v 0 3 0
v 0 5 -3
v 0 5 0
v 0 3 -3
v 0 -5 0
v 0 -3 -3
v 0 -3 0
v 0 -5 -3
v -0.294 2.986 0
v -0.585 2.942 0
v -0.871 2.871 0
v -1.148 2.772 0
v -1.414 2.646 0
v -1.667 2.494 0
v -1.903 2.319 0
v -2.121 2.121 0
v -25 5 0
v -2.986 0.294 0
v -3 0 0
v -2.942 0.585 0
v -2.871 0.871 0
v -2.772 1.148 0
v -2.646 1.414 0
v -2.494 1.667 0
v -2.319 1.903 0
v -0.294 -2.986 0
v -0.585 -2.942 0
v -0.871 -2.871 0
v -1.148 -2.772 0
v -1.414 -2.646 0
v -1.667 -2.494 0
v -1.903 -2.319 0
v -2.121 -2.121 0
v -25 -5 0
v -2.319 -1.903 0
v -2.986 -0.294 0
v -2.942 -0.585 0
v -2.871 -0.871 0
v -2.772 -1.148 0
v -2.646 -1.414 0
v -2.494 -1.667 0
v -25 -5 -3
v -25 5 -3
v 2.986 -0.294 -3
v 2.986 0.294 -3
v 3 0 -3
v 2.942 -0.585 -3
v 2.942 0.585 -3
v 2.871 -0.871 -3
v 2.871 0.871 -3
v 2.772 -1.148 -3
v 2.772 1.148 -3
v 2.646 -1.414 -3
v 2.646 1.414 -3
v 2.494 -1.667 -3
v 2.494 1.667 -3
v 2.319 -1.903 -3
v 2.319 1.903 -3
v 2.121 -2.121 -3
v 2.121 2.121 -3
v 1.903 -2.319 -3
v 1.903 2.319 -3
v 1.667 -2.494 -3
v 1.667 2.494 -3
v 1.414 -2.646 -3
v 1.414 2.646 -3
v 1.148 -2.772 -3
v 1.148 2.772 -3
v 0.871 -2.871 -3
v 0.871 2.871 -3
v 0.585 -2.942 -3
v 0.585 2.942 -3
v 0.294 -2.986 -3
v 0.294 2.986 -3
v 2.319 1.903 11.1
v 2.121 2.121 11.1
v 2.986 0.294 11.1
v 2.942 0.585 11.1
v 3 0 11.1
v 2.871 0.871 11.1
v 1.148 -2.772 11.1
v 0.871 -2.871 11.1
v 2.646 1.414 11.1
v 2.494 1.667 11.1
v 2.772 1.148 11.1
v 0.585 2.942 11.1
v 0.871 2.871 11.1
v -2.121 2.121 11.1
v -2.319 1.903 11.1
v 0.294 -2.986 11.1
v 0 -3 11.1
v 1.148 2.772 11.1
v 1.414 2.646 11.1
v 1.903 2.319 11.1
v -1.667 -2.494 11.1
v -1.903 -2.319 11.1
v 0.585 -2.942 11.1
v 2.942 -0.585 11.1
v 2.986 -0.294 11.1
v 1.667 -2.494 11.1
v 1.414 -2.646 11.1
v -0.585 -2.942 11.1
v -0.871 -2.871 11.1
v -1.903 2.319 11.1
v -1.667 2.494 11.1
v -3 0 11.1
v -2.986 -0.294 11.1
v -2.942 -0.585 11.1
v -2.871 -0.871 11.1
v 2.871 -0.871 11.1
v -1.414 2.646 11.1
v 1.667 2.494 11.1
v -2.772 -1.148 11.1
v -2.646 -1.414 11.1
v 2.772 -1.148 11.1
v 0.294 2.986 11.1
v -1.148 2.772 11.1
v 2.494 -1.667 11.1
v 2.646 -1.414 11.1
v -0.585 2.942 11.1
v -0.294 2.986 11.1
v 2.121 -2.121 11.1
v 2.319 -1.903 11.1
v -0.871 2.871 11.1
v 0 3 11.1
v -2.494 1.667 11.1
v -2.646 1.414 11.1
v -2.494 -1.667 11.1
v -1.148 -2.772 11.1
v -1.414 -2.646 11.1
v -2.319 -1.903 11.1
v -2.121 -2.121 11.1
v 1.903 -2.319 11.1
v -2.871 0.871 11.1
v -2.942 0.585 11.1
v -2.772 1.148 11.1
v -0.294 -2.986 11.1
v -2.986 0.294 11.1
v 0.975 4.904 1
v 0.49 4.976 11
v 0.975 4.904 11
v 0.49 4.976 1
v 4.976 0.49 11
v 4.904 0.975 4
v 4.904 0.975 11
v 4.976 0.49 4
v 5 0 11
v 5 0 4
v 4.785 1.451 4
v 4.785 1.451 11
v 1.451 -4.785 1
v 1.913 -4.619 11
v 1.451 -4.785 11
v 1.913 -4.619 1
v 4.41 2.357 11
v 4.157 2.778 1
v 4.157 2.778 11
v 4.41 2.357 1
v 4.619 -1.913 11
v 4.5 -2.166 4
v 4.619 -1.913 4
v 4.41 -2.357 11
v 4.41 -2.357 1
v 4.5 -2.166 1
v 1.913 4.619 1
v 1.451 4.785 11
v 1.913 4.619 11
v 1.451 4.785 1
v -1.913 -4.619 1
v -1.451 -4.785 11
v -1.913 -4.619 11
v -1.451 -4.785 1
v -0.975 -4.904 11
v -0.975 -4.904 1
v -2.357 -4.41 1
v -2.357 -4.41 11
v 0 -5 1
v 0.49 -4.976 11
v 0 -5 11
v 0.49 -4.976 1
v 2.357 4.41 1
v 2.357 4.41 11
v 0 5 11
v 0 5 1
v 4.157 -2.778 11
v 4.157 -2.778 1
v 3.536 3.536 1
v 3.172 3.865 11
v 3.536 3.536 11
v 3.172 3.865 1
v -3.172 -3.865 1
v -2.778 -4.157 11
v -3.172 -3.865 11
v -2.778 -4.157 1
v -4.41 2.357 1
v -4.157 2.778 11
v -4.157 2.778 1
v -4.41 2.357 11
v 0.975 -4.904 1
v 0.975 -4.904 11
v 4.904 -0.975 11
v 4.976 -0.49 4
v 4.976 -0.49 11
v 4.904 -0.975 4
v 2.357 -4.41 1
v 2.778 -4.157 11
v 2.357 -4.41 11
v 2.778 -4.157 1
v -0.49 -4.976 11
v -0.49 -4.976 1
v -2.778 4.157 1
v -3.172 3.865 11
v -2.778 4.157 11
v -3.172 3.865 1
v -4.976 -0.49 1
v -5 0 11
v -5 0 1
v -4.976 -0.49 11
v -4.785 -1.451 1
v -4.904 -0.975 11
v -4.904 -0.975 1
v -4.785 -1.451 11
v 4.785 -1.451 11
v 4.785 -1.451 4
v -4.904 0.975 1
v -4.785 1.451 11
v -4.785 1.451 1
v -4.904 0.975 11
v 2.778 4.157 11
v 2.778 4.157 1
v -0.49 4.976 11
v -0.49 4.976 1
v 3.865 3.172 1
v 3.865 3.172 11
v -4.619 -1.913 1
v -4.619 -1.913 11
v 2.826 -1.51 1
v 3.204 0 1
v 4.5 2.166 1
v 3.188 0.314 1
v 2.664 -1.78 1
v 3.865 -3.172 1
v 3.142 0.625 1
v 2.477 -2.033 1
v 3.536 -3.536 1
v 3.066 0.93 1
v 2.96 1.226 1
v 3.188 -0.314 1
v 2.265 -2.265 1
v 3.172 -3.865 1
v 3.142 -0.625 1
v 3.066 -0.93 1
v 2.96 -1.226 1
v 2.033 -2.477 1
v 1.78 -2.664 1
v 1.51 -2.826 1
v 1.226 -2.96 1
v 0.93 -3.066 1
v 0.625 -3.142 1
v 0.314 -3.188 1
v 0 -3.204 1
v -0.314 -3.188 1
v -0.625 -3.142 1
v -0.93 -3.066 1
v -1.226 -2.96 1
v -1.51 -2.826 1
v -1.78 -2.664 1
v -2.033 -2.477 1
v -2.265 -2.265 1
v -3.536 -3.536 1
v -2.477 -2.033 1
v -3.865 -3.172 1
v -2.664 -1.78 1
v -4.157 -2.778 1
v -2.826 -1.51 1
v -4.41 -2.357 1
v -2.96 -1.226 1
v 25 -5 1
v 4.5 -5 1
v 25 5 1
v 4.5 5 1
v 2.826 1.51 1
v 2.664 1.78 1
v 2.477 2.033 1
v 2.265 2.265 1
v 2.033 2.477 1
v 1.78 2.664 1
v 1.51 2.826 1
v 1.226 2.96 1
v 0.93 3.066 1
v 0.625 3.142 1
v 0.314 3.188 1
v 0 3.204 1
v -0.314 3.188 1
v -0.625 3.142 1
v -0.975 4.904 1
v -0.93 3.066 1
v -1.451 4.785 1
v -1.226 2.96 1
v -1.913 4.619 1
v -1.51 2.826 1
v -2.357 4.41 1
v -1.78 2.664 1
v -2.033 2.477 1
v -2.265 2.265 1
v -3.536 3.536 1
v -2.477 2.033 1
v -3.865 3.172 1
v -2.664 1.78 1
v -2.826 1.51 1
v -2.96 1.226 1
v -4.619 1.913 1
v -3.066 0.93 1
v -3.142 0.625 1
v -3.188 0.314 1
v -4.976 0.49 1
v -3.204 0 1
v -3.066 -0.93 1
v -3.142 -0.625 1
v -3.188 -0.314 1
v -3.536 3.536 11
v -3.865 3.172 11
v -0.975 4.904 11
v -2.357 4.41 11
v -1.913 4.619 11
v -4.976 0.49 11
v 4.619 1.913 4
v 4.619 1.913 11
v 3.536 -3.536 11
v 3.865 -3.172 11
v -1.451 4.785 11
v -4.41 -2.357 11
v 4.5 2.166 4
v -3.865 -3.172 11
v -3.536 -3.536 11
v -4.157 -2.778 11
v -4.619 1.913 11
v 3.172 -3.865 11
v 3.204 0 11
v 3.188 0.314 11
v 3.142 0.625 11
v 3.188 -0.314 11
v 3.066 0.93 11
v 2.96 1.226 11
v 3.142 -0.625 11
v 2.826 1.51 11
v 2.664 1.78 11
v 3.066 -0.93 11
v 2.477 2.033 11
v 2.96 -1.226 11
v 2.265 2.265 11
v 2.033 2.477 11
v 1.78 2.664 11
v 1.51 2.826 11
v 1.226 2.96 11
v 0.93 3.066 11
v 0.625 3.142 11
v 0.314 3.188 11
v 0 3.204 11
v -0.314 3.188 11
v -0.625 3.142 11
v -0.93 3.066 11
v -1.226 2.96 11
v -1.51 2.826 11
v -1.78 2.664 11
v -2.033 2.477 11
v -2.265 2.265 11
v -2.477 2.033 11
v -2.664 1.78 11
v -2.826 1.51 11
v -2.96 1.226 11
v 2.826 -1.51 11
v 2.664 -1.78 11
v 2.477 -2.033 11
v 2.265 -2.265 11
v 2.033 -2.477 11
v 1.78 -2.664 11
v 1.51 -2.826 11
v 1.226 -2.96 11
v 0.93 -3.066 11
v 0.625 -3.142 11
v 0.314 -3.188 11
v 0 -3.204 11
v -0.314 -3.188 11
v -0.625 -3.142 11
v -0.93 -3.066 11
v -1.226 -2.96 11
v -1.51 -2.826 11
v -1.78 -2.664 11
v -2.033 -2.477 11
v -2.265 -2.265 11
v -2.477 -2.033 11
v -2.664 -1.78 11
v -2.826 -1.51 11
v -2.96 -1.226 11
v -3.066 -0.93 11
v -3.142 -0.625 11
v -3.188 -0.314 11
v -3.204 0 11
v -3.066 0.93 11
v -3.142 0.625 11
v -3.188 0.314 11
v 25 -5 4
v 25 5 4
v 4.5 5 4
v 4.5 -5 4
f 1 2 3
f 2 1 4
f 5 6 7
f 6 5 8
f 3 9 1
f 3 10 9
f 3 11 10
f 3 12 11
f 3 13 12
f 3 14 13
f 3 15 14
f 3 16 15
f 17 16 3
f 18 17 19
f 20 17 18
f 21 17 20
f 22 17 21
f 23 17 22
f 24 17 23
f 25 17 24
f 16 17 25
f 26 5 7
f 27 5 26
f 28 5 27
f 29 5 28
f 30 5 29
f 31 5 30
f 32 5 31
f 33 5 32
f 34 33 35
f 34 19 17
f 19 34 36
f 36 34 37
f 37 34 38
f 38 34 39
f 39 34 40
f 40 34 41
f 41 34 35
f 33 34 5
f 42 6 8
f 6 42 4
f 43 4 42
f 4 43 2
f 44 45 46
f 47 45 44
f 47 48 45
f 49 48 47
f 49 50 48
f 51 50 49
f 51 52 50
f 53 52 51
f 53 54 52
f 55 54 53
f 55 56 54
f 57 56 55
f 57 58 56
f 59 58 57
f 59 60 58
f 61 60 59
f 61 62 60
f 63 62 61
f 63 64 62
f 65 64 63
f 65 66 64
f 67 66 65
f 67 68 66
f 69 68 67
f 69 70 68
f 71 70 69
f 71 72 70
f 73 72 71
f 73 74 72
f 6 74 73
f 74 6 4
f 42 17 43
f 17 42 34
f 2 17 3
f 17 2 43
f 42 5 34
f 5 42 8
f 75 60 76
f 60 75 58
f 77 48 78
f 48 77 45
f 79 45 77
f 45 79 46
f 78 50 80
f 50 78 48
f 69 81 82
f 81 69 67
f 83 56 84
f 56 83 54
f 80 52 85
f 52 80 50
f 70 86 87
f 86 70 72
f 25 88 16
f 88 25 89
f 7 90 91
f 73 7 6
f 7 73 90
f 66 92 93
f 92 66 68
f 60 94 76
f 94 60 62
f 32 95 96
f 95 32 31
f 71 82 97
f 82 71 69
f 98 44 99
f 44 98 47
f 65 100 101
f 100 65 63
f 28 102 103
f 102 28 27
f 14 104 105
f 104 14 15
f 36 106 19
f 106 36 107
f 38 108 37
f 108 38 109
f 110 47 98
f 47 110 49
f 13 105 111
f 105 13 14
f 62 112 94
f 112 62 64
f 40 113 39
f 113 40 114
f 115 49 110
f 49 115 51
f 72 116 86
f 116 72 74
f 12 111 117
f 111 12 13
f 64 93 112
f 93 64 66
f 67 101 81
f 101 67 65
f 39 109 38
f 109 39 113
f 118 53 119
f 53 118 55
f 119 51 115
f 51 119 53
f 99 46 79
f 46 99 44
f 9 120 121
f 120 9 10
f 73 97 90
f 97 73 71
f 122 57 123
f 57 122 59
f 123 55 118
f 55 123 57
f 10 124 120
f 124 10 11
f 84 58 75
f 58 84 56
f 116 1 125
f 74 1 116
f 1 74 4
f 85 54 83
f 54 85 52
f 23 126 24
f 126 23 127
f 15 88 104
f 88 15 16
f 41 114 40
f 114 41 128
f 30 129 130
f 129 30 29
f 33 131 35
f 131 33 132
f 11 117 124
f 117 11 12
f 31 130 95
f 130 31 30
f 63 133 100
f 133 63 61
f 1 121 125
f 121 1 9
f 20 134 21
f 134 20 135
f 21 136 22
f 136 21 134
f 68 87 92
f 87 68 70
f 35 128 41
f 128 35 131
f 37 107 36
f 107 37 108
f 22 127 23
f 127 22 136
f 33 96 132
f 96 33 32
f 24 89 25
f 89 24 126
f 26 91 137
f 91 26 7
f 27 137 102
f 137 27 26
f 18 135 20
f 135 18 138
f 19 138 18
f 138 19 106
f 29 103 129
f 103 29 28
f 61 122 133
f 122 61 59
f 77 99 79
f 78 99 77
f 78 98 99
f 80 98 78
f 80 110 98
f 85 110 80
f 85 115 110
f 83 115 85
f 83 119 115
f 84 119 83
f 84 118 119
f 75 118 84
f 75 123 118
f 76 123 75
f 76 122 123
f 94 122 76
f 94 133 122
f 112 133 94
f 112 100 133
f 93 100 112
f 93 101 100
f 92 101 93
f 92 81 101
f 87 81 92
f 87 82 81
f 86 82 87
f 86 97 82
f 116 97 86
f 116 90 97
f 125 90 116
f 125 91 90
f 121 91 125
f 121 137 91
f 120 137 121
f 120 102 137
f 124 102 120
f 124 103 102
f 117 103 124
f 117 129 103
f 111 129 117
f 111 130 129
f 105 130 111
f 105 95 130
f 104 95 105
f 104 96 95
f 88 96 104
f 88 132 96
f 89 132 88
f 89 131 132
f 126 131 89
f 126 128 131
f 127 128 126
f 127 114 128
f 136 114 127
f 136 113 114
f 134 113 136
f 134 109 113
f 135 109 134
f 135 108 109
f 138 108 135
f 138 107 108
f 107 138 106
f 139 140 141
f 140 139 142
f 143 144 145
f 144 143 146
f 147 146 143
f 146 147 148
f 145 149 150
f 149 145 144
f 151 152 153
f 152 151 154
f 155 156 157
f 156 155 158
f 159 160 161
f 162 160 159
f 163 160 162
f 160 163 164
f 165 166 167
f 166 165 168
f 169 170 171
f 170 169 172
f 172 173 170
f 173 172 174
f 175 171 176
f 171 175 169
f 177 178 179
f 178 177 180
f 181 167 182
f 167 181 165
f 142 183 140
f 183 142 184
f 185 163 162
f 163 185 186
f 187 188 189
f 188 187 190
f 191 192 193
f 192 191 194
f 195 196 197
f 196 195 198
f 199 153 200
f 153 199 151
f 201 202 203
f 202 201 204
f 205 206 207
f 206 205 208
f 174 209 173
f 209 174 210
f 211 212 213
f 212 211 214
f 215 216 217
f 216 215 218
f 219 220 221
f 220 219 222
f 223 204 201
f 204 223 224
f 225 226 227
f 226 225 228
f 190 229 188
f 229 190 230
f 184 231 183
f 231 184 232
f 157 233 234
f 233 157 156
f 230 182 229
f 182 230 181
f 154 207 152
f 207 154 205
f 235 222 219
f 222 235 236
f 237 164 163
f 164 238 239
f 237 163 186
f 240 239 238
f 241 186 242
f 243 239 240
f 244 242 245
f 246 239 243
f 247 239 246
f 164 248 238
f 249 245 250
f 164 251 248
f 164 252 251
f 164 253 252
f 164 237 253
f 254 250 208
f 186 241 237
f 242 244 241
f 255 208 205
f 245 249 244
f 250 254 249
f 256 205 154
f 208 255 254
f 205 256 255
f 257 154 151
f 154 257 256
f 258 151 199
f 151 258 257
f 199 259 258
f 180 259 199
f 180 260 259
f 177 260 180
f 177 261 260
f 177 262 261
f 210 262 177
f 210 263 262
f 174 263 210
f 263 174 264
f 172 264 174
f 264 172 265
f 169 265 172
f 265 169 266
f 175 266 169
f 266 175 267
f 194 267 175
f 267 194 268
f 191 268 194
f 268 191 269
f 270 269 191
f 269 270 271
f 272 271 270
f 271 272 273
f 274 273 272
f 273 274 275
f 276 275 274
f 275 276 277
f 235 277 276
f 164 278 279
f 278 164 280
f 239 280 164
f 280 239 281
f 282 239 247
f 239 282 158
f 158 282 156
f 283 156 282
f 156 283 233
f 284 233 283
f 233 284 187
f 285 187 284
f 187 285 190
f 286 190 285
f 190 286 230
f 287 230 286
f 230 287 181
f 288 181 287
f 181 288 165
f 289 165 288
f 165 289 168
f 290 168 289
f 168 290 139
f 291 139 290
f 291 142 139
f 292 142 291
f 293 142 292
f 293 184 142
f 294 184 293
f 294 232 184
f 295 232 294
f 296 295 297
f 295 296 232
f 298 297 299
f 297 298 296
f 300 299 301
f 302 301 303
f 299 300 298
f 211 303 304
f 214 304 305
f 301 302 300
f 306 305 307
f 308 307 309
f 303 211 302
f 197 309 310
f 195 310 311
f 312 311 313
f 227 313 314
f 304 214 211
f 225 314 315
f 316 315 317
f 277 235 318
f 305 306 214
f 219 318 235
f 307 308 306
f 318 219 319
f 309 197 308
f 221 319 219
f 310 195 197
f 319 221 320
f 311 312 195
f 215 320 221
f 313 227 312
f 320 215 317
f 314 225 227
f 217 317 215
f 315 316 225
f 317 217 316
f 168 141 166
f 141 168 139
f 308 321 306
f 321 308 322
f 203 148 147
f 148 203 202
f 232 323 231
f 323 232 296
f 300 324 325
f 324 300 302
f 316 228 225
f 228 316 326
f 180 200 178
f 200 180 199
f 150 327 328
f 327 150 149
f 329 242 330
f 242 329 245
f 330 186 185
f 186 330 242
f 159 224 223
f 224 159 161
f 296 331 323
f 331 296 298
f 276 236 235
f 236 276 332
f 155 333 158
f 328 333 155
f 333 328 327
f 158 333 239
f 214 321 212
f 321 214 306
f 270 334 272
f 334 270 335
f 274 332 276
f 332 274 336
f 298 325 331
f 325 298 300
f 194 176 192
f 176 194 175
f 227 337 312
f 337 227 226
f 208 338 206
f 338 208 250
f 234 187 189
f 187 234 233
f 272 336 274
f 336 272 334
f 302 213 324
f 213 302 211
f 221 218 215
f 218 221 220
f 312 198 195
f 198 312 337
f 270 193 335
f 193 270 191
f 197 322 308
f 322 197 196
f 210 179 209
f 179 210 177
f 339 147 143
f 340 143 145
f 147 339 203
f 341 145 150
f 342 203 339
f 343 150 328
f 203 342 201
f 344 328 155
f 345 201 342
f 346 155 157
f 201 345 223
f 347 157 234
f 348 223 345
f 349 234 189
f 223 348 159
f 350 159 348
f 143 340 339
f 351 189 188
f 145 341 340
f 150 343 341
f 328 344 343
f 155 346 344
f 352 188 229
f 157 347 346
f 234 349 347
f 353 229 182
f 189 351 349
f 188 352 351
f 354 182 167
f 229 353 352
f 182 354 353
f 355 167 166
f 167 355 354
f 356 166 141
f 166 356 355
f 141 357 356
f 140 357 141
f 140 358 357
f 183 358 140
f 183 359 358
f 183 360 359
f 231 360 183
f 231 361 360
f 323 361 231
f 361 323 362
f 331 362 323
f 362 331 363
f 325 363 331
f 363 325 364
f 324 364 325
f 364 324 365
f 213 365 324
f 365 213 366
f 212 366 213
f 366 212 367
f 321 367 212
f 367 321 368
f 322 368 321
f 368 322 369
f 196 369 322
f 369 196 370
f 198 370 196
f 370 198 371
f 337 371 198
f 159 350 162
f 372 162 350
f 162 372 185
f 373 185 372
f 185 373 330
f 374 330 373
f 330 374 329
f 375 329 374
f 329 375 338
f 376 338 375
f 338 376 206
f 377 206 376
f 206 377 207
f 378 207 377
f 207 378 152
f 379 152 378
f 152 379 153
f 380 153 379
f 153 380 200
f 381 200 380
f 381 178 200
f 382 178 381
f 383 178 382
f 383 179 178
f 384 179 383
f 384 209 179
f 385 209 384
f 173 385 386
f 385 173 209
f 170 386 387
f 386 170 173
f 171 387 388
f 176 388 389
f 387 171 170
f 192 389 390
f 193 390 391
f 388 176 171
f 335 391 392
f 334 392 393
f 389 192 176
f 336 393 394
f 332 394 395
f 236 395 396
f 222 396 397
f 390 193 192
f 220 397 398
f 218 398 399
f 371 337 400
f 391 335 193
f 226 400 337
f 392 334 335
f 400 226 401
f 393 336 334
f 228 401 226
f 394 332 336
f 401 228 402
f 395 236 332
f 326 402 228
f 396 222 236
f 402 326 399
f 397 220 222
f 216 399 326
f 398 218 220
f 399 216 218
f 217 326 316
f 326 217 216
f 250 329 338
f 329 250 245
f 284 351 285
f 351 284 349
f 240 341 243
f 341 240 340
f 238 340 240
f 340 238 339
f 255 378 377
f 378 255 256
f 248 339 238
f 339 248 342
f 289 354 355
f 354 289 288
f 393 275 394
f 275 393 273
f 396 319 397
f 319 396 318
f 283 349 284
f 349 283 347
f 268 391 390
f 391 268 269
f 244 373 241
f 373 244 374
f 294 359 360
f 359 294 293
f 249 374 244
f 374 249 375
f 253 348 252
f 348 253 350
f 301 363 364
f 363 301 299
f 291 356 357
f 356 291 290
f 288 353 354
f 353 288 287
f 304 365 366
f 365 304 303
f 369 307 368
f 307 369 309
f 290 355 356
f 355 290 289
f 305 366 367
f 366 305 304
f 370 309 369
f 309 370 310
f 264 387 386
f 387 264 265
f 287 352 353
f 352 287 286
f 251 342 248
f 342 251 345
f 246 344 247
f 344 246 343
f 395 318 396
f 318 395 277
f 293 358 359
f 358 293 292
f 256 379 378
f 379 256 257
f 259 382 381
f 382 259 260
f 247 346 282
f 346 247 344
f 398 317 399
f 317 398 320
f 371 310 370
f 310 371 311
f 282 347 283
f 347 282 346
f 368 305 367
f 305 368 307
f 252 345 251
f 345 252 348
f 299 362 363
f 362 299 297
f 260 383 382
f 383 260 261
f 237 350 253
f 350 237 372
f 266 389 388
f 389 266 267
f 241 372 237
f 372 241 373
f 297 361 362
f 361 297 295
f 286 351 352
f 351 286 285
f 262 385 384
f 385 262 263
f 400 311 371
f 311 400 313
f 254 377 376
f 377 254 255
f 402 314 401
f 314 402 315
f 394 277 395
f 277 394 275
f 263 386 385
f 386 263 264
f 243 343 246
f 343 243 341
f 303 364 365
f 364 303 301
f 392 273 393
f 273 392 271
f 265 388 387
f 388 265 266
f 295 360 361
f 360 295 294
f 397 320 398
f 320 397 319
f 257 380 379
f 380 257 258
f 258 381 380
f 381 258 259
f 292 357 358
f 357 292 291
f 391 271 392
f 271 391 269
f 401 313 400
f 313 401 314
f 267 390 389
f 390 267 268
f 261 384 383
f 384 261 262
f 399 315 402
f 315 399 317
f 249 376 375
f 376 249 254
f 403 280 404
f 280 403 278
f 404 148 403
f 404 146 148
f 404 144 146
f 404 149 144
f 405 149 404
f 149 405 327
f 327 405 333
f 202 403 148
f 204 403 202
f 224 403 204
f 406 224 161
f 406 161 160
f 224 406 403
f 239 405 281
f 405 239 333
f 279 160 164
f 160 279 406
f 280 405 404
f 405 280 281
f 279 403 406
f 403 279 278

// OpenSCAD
// Adversarial: a hinge with no retention feature at all.
// It passes parts, fit, motion and source-motion; only `axial-retention` fails,
// because pulling 2 mm simply slides the knuckle up the pin and the two solids
// stay separated. This is the case that makes the retention layer worth having:
// without it, "the leaf can be pulled off" would score as a success.
agentscad_part = "all";
hinge_angle = 0;
$fn = 64;

bore_d = 6.40 / cos(180 / $fn);

module fixed_leaf() {
  union() {
    translate([-25, -5, -3]) cube([25, 10, 3]);
    translate([0, 0, -3]) cylinder(h = 14.1, d = 6);       // pin ends at 11.1, no head
  }
}

module moving_leaf() {
  union() {
    difference() {
      translate([0, 0, 1]) cylinder(h = 10, d = 10);
      translate([0, 0, 0.9]) cylinder(h = 10.2, d = bore_d);
    }
    translate([4.5, -5, 1]) cube([20.5, 10, 3]);
  }
}

module generated_part() {
  if (agentscad_part == "all" || agentscad_part == "fixed") fixed_leaf();
  if (agentscad_part == "all" || agentscad_part == "moving") rotate([0, 0, hinge_angle]) moving_leaf();
}

generated_part();
